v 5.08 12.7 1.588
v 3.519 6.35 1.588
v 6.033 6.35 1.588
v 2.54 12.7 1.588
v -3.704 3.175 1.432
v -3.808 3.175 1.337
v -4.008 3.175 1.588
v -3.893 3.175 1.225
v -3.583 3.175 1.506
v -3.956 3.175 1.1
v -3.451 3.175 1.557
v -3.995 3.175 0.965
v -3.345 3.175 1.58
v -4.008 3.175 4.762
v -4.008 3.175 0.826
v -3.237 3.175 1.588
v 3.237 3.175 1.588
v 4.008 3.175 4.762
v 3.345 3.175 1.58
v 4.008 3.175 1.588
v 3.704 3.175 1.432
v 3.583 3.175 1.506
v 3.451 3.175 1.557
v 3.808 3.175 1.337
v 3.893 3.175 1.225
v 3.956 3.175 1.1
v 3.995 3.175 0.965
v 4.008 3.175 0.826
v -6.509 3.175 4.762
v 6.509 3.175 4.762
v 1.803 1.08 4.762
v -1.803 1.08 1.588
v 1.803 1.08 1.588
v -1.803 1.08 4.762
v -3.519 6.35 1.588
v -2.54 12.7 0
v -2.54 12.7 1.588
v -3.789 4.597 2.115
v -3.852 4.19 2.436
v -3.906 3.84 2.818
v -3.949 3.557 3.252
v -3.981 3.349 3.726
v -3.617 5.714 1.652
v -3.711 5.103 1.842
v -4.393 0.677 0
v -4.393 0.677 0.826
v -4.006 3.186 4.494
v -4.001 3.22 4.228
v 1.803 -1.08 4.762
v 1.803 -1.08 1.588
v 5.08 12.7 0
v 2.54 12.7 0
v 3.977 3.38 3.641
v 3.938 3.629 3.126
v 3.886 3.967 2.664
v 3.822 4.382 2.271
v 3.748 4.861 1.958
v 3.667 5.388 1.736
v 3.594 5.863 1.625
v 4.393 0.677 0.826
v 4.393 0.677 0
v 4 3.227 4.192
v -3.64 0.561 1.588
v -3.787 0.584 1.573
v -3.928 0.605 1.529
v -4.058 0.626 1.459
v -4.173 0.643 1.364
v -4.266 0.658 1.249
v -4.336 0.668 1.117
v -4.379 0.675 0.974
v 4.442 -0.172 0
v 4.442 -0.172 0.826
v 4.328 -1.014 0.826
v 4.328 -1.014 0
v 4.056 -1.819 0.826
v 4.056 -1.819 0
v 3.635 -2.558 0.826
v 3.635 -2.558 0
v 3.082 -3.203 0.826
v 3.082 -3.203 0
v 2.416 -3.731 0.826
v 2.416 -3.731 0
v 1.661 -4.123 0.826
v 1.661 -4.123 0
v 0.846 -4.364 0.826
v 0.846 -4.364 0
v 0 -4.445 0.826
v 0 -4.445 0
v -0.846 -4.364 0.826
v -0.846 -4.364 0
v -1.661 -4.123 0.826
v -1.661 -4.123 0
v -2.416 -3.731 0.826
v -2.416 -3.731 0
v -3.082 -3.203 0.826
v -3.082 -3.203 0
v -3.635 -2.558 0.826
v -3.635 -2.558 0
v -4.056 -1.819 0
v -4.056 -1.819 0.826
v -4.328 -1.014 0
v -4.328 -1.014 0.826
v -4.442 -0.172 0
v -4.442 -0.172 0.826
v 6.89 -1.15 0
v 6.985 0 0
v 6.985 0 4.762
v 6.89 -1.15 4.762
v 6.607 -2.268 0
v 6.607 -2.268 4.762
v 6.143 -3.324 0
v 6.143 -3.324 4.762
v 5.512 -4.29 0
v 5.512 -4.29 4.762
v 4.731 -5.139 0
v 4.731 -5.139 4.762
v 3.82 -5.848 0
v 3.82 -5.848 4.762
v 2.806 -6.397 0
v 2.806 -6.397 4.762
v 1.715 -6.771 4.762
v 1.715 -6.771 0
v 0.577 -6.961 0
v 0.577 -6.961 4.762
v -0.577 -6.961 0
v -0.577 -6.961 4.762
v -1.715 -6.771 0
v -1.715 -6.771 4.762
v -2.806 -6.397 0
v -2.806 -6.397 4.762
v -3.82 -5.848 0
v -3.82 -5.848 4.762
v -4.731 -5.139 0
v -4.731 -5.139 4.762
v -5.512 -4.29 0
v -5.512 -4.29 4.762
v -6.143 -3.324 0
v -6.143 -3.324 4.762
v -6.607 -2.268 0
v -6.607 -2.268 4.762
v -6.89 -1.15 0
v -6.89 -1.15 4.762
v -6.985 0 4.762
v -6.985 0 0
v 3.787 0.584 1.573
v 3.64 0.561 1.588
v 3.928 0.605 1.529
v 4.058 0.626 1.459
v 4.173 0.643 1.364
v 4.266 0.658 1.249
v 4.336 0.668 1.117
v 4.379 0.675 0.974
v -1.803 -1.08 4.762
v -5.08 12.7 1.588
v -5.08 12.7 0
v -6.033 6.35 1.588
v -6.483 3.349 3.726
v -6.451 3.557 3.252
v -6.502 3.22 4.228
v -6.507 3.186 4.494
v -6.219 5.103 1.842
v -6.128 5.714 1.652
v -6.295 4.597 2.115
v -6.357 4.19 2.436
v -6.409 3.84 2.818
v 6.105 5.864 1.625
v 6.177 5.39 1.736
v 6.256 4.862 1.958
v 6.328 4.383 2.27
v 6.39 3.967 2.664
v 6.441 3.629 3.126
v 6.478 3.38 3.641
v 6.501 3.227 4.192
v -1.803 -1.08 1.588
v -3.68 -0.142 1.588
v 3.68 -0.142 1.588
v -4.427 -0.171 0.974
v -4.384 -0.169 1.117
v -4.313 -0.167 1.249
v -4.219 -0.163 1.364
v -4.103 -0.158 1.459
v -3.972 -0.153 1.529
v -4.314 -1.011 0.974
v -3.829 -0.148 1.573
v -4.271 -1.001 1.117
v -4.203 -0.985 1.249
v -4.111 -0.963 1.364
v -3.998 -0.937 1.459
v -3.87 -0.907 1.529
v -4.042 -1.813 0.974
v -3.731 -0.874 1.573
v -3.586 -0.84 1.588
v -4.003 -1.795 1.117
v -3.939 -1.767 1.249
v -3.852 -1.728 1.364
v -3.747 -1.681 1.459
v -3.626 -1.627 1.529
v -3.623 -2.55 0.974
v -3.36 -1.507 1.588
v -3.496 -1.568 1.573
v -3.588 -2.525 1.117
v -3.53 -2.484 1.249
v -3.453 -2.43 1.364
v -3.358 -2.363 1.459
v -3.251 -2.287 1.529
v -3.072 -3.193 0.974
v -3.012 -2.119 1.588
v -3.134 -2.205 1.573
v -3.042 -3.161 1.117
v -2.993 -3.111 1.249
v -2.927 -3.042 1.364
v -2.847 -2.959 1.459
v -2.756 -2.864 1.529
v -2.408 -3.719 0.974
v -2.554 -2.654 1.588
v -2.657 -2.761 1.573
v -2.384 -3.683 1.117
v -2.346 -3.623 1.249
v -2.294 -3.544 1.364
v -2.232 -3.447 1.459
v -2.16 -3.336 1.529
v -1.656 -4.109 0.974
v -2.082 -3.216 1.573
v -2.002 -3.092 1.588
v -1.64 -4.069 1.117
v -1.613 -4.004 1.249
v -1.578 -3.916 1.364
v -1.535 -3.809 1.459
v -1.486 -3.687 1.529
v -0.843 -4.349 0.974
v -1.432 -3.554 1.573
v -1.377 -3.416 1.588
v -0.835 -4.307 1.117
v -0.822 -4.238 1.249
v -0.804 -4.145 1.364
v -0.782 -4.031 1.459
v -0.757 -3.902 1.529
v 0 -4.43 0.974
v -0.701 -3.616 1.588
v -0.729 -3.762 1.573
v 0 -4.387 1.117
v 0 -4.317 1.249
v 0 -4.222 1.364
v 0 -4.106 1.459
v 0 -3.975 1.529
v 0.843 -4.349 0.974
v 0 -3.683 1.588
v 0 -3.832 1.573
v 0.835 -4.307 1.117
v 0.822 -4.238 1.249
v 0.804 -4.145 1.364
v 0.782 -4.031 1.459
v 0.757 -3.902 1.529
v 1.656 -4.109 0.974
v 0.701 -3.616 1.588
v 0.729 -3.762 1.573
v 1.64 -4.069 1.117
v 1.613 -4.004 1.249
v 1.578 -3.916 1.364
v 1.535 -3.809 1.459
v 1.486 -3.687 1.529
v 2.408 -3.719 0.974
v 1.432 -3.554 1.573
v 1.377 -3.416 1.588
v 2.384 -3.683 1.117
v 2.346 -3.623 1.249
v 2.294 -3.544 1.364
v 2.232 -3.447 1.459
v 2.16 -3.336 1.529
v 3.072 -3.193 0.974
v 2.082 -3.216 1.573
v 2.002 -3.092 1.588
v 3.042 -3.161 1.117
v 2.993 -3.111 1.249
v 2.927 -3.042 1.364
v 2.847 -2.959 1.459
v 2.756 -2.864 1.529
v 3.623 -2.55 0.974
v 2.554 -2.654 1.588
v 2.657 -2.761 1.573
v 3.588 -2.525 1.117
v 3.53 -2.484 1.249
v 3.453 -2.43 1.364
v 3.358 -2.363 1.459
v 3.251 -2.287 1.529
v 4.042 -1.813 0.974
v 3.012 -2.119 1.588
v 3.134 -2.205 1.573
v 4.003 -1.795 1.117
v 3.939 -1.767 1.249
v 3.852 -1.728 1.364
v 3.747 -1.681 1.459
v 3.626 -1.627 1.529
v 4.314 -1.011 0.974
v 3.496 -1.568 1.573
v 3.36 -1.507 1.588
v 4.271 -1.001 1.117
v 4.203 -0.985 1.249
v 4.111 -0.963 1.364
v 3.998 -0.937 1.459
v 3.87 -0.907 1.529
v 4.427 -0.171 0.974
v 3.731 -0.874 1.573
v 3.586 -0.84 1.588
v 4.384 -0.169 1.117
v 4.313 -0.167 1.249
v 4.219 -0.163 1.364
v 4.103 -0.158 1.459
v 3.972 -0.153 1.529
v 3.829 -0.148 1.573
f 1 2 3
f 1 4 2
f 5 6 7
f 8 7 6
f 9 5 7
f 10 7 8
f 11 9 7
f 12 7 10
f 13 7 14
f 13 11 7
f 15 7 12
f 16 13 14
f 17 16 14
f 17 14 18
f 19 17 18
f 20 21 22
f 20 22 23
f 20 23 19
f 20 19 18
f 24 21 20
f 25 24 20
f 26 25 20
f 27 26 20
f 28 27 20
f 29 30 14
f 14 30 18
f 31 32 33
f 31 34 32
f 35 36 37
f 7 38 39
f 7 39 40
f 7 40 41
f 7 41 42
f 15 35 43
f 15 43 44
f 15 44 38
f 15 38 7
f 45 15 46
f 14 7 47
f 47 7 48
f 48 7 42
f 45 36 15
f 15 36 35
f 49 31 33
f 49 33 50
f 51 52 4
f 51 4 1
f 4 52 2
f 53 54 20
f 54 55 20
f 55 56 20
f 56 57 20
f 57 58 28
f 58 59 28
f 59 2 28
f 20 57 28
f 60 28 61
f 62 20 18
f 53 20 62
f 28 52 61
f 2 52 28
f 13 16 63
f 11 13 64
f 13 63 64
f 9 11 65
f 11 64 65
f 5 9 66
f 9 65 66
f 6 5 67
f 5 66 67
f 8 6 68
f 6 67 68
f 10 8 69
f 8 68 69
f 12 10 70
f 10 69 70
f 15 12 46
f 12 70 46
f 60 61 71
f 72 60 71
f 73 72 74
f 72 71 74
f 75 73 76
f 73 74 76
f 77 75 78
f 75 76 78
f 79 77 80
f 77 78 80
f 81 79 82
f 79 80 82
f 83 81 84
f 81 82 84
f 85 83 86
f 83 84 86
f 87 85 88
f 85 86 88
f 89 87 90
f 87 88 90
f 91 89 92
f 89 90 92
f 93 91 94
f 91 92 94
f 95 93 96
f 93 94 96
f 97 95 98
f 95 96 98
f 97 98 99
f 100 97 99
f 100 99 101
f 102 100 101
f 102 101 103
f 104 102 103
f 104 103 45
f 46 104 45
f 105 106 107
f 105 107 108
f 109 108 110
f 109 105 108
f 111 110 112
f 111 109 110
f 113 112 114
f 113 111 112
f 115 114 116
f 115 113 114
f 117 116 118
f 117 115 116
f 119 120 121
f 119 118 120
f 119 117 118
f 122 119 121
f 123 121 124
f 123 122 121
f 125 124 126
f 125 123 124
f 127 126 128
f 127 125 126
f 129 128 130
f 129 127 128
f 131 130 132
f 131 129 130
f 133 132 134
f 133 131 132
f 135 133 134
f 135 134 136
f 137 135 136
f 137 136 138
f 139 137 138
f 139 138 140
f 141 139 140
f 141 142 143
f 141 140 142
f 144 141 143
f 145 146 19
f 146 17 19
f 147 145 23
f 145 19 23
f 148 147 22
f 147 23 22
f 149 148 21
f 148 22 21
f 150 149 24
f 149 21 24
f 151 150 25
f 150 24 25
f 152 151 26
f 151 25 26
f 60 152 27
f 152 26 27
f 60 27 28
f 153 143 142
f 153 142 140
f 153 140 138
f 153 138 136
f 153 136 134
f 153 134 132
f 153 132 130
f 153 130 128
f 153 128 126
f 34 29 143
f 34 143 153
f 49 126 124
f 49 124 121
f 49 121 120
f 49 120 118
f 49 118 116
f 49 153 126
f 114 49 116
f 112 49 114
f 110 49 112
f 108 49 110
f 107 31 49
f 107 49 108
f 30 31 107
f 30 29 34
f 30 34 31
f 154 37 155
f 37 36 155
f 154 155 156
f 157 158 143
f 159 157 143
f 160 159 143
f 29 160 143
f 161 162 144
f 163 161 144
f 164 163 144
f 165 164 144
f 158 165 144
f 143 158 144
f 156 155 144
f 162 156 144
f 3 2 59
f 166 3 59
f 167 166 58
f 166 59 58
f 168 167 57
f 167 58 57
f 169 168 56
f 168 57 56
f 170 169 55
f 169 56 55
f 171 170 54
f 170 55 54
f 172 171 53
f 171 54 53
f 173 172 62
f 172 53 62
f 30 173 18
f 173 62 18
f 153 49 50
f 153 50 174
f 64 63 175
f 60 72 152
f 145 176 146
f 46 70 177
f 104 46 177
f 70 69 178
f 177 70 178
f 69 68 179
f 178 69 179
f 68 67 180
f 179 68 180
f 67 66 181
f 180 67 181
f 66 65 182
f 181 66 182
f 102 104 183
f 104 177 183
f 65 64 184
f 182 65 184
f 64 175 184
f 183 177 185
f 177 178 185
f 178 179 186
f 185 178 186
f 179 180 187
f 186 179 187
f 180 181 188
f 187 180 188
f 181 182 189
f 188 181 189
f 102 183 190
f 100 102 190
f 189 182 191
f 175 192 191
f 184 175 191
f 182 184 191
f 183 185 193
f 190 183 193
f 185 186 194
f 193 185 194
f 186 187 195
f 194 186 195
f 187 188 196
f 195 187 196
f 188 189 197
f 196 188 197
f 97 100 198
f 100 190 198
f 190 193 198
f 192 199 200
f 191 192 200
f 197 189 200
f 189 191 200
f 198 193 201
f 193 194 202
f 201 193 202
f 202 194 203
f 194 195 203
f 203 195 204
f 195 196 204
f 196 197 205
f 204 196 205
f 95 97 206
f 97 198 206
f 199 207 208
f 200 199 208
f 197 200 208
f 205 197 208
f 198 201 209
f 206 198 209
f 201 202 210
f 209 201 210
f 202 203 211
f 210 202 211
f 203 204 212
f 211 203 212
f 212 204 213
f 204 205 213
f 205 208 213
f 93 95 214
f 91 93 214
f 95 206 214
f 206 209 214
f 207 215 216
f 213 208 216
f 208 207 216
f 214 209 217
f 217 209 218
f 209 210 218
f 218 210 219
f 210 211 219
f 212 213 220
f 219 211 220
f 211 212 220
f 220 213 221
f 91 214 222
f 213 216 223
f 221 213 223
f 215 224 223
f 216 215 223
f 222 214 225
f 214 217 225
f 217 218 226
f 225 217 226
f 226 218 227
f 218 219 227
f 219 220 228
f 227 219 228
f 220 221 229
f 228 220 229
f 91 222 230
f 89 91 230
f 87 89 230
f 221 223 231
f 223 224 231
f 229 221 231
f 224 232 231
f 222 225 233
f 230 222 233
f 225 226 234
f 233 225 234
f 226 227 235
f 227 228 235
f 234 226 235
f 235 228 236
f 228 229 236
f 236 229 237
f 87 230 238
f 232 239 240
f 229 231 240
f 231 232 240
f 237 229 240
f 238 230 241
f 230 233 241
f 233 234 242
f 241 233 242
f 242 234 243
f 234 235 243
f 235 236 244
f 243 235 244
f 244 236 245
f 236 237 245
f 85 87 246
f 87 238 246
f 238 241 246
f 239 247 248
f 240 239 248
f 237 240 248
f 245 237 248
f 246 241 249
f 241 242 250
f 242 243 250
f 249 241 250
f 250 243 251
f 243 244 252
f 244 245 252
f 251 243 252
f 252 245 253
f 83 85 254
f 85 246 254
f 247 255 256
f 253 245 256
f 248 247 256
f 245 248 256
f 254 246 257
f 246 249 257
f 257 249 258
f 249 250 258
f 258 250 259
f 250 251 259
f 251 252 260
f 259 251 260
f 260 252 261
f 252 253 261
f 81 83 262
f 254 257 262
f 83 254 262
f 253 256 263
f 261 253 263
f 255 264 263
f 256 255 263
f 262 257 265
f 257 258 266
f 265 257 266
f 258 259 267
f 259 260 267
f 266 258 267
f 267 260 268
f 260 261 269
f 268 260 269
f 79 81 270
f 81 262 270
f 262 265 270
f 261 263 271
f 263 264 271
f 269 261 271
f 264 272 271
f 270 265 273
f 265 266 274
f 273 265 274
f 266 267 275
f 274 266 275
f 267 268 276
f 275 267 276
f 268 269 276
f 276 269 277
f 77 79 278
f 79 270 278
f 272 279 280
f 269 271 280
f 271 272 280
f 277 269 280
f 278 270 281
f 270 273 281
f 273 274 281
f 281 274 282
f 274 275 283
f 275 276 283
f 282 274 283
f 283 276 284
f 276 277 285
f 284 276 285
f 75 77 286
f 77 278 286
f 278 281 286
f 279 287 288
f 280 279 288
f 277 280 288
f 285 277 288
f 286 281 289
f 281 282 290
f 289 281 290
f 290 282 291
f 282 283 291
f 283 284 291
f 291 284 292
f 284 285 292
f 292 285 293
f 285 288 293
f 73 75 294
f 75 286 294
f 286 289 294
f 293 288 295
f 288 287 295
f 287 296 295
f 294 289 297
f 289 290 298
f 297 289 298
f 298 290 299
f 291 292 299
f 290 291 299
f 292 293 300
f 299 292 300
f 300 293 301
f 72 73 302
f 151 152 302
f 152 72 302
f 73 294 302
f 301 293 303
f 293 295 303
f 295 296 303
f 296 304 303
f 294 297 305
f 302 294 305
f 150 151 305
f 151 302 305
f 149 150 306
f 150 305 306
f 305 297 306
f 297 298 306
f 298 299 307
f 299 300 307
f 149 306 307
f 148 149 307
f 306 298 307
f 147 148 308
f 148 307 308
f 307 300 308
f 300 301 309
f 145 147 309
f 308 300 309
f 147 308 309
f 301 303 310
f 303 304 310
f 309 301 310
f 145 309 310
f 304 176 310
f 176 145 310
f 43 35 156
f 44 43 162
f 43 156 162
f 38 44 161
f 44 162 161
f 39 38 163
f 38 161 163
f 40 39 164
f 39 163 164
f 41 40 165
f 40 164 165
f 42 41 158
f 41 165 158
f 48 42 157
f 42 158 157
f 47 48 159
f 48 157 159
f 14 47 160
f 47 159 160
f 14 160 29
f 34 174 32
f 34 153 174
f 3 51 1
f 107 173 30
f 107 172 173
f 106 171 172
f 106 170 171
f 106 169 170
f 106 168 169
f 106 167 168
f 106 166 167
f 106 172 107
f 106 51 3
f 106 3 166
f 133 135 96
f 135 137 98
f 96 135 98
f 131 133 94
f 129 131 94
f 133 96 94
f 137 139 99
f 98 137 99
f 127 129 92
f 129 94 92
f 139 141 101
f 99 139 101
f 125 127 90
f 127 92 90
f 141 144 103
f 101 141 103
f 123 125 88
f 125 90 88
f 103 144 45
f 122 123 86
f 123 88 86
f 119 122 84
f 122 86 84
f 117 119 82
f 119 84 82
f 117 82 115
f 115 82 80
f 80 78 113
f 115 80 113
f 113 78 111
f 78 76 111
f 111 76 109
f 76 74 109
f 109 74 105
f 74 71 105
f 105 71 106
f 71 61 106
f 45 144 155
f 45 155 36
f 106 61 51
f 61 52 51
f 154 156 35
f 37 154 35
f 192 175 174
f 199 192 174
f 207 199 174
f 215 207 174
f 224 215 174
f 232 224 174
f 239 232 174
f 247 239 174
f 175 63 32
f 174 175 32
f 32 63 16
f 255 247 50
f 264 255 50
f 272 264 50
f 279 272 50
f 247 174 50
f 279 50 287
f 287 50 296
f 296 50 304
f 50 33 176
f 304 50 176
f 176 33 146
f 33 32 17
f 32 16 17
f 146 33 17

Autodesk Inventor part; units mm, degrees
ref_plane "YZ Plane" through (0, 0, 0) normal (1, 0, 0) x (0, 1, 0)
ref_plane "XZ Plane" through (0, 0, 0) normal (0, 1, 0) x (-1, 0, 0)
sketch "Sketch1" plane through (0, 0, 0) normal (0, 0, 1) x (1, 0, 0)
  circle A0 centre (0, 0) radius 4.445
  line L0 (0, 0) -> (0, 12.7)
  line L1 (0, 12.7) -> (-2.54, 12.7)
  line L2 (-2.54, 12.7) -> (2.54, 12.7)
  line L3 (-2.54, 12.7) -> (-4.3931, 0.6771)
  line L4 (2.54, 12.7) -> (4.3931, 0.6771)
  line L5 (-2.54, 12.7) -> (-5.08, 12.7)
  line L6 (-5.08, 12.7) -> (-6.985, 0)
  line L7 (-6.985, 0) -> (-4.445, 0)
  line L8 (2.54, 12.7) -> (5.08, 12.7)
  line L9 (5.08, 12.7) -> (6.985, 0)
  line L10 (6.985, 0) -> (4.445, 0)
  arc A1 (-6.985, 0) -> (6.985, 0) centre (0, 0) ccw
  dimension "d0" = 8.89
  dimension "d1" = 12.7
  dimension "d2" = 2.54
  dimension "d3" = 5.08
  dimension "d4" = 2.54
  dimension "d5" = 2.54
  dimension "d6" = 2.54
  dimension "d7" = 2.54
extrude "Extrusion1" add sketch "Sketch1" along normal blind 1.5875 contours L10 A1 L7 A0 | A0 L4 L8 L9 L10 | L7 L6 L5 L3 A0
sketch "Sketch2" plane through (0, 0, 1.5875) normal (0, 0, 1) x (1, 0, 0)
  line L0 (-2.54, 12.7) -> (-5.08, 12.7) projected
  line L1 (-5.08, 12.7) -> (-6.985, 0) projected
  arc A0 (-6.985, 0) -> (6.985, 0) centre (0, 0) ccw projected
  line L2 (6.985, 0) -> (5.08, 12.7) projected
  line L3 (5.08, 12.7) -> (2.54, 12.7) projected
  line L4 (2.54, 12.7) -> (4.3931, 0.6771) projected
  arc A1 (-4.3931, 0.6771) -> (4.3931, 0.6771) centre (0, 0) ccw projected
  line L5 (-4.3931, 0.6771) -> (-2.54, 12.7) projected
  line L6 (-6.5088, 3.175) -> (6.5087, 3.175)
  dimension "d18" = 3.175
ref_plane "Work Plane1" through (0, 0, 6.35) normal (0, 0, 1) x (1, 0, 0)
extrude "Extrusion4" add sketch "Sketch2" along normal blind 3.175 contours L6 L4 A1 L5 | L5 A1 L4 L6 L2 A0 L1
sketch "Sketch4" plane through (0, 0, 4.7625) normal (0, 0, 1) x (1, 0, 0)
  line L0 (-1.8034, 1.0795) -> (1.8034, 1.0795)
  line L1 (1.8034, 1.0795) -> (1.8034, -1.0795)
  line L2 (1.8034, -1.0795) -> (-1.8034, -1.0795)
  line L3 (-1.8034, -1.0795) -> (-1.8034, 1.0795)
  arc A0 (-6.985, 0) -> (6.985, 0) centre (0, 0) ccw projected
  point P0 (0, 0)
  dimension "d23" = 3.6068
  dimension "d24" = 2.159
  dimension "d25" = 1.8034
  dimension "d26" = 1.0795
extrude "Extrusion6" cut sketch "Sketch4" against normal blind 3.175
fillet "Fillet1" radius 3.175 2 edges at (-5.2584, 3.175, 1.5875) (5.2584, 3.175, 1.5875)
fillet "Fillet2" radius 0.762 3 edges at (-4.2006, 1.9261, 1.5875) (4.2006, 1.9261, 1.5875) (0, -4.445, 1.5875)
equation "\"d25\" = 0.5 * d23"
equation "\"d26\" = 0.5 * d24"
properties part number "servoPotentiometerAttachment" material "ABS Plastic"
